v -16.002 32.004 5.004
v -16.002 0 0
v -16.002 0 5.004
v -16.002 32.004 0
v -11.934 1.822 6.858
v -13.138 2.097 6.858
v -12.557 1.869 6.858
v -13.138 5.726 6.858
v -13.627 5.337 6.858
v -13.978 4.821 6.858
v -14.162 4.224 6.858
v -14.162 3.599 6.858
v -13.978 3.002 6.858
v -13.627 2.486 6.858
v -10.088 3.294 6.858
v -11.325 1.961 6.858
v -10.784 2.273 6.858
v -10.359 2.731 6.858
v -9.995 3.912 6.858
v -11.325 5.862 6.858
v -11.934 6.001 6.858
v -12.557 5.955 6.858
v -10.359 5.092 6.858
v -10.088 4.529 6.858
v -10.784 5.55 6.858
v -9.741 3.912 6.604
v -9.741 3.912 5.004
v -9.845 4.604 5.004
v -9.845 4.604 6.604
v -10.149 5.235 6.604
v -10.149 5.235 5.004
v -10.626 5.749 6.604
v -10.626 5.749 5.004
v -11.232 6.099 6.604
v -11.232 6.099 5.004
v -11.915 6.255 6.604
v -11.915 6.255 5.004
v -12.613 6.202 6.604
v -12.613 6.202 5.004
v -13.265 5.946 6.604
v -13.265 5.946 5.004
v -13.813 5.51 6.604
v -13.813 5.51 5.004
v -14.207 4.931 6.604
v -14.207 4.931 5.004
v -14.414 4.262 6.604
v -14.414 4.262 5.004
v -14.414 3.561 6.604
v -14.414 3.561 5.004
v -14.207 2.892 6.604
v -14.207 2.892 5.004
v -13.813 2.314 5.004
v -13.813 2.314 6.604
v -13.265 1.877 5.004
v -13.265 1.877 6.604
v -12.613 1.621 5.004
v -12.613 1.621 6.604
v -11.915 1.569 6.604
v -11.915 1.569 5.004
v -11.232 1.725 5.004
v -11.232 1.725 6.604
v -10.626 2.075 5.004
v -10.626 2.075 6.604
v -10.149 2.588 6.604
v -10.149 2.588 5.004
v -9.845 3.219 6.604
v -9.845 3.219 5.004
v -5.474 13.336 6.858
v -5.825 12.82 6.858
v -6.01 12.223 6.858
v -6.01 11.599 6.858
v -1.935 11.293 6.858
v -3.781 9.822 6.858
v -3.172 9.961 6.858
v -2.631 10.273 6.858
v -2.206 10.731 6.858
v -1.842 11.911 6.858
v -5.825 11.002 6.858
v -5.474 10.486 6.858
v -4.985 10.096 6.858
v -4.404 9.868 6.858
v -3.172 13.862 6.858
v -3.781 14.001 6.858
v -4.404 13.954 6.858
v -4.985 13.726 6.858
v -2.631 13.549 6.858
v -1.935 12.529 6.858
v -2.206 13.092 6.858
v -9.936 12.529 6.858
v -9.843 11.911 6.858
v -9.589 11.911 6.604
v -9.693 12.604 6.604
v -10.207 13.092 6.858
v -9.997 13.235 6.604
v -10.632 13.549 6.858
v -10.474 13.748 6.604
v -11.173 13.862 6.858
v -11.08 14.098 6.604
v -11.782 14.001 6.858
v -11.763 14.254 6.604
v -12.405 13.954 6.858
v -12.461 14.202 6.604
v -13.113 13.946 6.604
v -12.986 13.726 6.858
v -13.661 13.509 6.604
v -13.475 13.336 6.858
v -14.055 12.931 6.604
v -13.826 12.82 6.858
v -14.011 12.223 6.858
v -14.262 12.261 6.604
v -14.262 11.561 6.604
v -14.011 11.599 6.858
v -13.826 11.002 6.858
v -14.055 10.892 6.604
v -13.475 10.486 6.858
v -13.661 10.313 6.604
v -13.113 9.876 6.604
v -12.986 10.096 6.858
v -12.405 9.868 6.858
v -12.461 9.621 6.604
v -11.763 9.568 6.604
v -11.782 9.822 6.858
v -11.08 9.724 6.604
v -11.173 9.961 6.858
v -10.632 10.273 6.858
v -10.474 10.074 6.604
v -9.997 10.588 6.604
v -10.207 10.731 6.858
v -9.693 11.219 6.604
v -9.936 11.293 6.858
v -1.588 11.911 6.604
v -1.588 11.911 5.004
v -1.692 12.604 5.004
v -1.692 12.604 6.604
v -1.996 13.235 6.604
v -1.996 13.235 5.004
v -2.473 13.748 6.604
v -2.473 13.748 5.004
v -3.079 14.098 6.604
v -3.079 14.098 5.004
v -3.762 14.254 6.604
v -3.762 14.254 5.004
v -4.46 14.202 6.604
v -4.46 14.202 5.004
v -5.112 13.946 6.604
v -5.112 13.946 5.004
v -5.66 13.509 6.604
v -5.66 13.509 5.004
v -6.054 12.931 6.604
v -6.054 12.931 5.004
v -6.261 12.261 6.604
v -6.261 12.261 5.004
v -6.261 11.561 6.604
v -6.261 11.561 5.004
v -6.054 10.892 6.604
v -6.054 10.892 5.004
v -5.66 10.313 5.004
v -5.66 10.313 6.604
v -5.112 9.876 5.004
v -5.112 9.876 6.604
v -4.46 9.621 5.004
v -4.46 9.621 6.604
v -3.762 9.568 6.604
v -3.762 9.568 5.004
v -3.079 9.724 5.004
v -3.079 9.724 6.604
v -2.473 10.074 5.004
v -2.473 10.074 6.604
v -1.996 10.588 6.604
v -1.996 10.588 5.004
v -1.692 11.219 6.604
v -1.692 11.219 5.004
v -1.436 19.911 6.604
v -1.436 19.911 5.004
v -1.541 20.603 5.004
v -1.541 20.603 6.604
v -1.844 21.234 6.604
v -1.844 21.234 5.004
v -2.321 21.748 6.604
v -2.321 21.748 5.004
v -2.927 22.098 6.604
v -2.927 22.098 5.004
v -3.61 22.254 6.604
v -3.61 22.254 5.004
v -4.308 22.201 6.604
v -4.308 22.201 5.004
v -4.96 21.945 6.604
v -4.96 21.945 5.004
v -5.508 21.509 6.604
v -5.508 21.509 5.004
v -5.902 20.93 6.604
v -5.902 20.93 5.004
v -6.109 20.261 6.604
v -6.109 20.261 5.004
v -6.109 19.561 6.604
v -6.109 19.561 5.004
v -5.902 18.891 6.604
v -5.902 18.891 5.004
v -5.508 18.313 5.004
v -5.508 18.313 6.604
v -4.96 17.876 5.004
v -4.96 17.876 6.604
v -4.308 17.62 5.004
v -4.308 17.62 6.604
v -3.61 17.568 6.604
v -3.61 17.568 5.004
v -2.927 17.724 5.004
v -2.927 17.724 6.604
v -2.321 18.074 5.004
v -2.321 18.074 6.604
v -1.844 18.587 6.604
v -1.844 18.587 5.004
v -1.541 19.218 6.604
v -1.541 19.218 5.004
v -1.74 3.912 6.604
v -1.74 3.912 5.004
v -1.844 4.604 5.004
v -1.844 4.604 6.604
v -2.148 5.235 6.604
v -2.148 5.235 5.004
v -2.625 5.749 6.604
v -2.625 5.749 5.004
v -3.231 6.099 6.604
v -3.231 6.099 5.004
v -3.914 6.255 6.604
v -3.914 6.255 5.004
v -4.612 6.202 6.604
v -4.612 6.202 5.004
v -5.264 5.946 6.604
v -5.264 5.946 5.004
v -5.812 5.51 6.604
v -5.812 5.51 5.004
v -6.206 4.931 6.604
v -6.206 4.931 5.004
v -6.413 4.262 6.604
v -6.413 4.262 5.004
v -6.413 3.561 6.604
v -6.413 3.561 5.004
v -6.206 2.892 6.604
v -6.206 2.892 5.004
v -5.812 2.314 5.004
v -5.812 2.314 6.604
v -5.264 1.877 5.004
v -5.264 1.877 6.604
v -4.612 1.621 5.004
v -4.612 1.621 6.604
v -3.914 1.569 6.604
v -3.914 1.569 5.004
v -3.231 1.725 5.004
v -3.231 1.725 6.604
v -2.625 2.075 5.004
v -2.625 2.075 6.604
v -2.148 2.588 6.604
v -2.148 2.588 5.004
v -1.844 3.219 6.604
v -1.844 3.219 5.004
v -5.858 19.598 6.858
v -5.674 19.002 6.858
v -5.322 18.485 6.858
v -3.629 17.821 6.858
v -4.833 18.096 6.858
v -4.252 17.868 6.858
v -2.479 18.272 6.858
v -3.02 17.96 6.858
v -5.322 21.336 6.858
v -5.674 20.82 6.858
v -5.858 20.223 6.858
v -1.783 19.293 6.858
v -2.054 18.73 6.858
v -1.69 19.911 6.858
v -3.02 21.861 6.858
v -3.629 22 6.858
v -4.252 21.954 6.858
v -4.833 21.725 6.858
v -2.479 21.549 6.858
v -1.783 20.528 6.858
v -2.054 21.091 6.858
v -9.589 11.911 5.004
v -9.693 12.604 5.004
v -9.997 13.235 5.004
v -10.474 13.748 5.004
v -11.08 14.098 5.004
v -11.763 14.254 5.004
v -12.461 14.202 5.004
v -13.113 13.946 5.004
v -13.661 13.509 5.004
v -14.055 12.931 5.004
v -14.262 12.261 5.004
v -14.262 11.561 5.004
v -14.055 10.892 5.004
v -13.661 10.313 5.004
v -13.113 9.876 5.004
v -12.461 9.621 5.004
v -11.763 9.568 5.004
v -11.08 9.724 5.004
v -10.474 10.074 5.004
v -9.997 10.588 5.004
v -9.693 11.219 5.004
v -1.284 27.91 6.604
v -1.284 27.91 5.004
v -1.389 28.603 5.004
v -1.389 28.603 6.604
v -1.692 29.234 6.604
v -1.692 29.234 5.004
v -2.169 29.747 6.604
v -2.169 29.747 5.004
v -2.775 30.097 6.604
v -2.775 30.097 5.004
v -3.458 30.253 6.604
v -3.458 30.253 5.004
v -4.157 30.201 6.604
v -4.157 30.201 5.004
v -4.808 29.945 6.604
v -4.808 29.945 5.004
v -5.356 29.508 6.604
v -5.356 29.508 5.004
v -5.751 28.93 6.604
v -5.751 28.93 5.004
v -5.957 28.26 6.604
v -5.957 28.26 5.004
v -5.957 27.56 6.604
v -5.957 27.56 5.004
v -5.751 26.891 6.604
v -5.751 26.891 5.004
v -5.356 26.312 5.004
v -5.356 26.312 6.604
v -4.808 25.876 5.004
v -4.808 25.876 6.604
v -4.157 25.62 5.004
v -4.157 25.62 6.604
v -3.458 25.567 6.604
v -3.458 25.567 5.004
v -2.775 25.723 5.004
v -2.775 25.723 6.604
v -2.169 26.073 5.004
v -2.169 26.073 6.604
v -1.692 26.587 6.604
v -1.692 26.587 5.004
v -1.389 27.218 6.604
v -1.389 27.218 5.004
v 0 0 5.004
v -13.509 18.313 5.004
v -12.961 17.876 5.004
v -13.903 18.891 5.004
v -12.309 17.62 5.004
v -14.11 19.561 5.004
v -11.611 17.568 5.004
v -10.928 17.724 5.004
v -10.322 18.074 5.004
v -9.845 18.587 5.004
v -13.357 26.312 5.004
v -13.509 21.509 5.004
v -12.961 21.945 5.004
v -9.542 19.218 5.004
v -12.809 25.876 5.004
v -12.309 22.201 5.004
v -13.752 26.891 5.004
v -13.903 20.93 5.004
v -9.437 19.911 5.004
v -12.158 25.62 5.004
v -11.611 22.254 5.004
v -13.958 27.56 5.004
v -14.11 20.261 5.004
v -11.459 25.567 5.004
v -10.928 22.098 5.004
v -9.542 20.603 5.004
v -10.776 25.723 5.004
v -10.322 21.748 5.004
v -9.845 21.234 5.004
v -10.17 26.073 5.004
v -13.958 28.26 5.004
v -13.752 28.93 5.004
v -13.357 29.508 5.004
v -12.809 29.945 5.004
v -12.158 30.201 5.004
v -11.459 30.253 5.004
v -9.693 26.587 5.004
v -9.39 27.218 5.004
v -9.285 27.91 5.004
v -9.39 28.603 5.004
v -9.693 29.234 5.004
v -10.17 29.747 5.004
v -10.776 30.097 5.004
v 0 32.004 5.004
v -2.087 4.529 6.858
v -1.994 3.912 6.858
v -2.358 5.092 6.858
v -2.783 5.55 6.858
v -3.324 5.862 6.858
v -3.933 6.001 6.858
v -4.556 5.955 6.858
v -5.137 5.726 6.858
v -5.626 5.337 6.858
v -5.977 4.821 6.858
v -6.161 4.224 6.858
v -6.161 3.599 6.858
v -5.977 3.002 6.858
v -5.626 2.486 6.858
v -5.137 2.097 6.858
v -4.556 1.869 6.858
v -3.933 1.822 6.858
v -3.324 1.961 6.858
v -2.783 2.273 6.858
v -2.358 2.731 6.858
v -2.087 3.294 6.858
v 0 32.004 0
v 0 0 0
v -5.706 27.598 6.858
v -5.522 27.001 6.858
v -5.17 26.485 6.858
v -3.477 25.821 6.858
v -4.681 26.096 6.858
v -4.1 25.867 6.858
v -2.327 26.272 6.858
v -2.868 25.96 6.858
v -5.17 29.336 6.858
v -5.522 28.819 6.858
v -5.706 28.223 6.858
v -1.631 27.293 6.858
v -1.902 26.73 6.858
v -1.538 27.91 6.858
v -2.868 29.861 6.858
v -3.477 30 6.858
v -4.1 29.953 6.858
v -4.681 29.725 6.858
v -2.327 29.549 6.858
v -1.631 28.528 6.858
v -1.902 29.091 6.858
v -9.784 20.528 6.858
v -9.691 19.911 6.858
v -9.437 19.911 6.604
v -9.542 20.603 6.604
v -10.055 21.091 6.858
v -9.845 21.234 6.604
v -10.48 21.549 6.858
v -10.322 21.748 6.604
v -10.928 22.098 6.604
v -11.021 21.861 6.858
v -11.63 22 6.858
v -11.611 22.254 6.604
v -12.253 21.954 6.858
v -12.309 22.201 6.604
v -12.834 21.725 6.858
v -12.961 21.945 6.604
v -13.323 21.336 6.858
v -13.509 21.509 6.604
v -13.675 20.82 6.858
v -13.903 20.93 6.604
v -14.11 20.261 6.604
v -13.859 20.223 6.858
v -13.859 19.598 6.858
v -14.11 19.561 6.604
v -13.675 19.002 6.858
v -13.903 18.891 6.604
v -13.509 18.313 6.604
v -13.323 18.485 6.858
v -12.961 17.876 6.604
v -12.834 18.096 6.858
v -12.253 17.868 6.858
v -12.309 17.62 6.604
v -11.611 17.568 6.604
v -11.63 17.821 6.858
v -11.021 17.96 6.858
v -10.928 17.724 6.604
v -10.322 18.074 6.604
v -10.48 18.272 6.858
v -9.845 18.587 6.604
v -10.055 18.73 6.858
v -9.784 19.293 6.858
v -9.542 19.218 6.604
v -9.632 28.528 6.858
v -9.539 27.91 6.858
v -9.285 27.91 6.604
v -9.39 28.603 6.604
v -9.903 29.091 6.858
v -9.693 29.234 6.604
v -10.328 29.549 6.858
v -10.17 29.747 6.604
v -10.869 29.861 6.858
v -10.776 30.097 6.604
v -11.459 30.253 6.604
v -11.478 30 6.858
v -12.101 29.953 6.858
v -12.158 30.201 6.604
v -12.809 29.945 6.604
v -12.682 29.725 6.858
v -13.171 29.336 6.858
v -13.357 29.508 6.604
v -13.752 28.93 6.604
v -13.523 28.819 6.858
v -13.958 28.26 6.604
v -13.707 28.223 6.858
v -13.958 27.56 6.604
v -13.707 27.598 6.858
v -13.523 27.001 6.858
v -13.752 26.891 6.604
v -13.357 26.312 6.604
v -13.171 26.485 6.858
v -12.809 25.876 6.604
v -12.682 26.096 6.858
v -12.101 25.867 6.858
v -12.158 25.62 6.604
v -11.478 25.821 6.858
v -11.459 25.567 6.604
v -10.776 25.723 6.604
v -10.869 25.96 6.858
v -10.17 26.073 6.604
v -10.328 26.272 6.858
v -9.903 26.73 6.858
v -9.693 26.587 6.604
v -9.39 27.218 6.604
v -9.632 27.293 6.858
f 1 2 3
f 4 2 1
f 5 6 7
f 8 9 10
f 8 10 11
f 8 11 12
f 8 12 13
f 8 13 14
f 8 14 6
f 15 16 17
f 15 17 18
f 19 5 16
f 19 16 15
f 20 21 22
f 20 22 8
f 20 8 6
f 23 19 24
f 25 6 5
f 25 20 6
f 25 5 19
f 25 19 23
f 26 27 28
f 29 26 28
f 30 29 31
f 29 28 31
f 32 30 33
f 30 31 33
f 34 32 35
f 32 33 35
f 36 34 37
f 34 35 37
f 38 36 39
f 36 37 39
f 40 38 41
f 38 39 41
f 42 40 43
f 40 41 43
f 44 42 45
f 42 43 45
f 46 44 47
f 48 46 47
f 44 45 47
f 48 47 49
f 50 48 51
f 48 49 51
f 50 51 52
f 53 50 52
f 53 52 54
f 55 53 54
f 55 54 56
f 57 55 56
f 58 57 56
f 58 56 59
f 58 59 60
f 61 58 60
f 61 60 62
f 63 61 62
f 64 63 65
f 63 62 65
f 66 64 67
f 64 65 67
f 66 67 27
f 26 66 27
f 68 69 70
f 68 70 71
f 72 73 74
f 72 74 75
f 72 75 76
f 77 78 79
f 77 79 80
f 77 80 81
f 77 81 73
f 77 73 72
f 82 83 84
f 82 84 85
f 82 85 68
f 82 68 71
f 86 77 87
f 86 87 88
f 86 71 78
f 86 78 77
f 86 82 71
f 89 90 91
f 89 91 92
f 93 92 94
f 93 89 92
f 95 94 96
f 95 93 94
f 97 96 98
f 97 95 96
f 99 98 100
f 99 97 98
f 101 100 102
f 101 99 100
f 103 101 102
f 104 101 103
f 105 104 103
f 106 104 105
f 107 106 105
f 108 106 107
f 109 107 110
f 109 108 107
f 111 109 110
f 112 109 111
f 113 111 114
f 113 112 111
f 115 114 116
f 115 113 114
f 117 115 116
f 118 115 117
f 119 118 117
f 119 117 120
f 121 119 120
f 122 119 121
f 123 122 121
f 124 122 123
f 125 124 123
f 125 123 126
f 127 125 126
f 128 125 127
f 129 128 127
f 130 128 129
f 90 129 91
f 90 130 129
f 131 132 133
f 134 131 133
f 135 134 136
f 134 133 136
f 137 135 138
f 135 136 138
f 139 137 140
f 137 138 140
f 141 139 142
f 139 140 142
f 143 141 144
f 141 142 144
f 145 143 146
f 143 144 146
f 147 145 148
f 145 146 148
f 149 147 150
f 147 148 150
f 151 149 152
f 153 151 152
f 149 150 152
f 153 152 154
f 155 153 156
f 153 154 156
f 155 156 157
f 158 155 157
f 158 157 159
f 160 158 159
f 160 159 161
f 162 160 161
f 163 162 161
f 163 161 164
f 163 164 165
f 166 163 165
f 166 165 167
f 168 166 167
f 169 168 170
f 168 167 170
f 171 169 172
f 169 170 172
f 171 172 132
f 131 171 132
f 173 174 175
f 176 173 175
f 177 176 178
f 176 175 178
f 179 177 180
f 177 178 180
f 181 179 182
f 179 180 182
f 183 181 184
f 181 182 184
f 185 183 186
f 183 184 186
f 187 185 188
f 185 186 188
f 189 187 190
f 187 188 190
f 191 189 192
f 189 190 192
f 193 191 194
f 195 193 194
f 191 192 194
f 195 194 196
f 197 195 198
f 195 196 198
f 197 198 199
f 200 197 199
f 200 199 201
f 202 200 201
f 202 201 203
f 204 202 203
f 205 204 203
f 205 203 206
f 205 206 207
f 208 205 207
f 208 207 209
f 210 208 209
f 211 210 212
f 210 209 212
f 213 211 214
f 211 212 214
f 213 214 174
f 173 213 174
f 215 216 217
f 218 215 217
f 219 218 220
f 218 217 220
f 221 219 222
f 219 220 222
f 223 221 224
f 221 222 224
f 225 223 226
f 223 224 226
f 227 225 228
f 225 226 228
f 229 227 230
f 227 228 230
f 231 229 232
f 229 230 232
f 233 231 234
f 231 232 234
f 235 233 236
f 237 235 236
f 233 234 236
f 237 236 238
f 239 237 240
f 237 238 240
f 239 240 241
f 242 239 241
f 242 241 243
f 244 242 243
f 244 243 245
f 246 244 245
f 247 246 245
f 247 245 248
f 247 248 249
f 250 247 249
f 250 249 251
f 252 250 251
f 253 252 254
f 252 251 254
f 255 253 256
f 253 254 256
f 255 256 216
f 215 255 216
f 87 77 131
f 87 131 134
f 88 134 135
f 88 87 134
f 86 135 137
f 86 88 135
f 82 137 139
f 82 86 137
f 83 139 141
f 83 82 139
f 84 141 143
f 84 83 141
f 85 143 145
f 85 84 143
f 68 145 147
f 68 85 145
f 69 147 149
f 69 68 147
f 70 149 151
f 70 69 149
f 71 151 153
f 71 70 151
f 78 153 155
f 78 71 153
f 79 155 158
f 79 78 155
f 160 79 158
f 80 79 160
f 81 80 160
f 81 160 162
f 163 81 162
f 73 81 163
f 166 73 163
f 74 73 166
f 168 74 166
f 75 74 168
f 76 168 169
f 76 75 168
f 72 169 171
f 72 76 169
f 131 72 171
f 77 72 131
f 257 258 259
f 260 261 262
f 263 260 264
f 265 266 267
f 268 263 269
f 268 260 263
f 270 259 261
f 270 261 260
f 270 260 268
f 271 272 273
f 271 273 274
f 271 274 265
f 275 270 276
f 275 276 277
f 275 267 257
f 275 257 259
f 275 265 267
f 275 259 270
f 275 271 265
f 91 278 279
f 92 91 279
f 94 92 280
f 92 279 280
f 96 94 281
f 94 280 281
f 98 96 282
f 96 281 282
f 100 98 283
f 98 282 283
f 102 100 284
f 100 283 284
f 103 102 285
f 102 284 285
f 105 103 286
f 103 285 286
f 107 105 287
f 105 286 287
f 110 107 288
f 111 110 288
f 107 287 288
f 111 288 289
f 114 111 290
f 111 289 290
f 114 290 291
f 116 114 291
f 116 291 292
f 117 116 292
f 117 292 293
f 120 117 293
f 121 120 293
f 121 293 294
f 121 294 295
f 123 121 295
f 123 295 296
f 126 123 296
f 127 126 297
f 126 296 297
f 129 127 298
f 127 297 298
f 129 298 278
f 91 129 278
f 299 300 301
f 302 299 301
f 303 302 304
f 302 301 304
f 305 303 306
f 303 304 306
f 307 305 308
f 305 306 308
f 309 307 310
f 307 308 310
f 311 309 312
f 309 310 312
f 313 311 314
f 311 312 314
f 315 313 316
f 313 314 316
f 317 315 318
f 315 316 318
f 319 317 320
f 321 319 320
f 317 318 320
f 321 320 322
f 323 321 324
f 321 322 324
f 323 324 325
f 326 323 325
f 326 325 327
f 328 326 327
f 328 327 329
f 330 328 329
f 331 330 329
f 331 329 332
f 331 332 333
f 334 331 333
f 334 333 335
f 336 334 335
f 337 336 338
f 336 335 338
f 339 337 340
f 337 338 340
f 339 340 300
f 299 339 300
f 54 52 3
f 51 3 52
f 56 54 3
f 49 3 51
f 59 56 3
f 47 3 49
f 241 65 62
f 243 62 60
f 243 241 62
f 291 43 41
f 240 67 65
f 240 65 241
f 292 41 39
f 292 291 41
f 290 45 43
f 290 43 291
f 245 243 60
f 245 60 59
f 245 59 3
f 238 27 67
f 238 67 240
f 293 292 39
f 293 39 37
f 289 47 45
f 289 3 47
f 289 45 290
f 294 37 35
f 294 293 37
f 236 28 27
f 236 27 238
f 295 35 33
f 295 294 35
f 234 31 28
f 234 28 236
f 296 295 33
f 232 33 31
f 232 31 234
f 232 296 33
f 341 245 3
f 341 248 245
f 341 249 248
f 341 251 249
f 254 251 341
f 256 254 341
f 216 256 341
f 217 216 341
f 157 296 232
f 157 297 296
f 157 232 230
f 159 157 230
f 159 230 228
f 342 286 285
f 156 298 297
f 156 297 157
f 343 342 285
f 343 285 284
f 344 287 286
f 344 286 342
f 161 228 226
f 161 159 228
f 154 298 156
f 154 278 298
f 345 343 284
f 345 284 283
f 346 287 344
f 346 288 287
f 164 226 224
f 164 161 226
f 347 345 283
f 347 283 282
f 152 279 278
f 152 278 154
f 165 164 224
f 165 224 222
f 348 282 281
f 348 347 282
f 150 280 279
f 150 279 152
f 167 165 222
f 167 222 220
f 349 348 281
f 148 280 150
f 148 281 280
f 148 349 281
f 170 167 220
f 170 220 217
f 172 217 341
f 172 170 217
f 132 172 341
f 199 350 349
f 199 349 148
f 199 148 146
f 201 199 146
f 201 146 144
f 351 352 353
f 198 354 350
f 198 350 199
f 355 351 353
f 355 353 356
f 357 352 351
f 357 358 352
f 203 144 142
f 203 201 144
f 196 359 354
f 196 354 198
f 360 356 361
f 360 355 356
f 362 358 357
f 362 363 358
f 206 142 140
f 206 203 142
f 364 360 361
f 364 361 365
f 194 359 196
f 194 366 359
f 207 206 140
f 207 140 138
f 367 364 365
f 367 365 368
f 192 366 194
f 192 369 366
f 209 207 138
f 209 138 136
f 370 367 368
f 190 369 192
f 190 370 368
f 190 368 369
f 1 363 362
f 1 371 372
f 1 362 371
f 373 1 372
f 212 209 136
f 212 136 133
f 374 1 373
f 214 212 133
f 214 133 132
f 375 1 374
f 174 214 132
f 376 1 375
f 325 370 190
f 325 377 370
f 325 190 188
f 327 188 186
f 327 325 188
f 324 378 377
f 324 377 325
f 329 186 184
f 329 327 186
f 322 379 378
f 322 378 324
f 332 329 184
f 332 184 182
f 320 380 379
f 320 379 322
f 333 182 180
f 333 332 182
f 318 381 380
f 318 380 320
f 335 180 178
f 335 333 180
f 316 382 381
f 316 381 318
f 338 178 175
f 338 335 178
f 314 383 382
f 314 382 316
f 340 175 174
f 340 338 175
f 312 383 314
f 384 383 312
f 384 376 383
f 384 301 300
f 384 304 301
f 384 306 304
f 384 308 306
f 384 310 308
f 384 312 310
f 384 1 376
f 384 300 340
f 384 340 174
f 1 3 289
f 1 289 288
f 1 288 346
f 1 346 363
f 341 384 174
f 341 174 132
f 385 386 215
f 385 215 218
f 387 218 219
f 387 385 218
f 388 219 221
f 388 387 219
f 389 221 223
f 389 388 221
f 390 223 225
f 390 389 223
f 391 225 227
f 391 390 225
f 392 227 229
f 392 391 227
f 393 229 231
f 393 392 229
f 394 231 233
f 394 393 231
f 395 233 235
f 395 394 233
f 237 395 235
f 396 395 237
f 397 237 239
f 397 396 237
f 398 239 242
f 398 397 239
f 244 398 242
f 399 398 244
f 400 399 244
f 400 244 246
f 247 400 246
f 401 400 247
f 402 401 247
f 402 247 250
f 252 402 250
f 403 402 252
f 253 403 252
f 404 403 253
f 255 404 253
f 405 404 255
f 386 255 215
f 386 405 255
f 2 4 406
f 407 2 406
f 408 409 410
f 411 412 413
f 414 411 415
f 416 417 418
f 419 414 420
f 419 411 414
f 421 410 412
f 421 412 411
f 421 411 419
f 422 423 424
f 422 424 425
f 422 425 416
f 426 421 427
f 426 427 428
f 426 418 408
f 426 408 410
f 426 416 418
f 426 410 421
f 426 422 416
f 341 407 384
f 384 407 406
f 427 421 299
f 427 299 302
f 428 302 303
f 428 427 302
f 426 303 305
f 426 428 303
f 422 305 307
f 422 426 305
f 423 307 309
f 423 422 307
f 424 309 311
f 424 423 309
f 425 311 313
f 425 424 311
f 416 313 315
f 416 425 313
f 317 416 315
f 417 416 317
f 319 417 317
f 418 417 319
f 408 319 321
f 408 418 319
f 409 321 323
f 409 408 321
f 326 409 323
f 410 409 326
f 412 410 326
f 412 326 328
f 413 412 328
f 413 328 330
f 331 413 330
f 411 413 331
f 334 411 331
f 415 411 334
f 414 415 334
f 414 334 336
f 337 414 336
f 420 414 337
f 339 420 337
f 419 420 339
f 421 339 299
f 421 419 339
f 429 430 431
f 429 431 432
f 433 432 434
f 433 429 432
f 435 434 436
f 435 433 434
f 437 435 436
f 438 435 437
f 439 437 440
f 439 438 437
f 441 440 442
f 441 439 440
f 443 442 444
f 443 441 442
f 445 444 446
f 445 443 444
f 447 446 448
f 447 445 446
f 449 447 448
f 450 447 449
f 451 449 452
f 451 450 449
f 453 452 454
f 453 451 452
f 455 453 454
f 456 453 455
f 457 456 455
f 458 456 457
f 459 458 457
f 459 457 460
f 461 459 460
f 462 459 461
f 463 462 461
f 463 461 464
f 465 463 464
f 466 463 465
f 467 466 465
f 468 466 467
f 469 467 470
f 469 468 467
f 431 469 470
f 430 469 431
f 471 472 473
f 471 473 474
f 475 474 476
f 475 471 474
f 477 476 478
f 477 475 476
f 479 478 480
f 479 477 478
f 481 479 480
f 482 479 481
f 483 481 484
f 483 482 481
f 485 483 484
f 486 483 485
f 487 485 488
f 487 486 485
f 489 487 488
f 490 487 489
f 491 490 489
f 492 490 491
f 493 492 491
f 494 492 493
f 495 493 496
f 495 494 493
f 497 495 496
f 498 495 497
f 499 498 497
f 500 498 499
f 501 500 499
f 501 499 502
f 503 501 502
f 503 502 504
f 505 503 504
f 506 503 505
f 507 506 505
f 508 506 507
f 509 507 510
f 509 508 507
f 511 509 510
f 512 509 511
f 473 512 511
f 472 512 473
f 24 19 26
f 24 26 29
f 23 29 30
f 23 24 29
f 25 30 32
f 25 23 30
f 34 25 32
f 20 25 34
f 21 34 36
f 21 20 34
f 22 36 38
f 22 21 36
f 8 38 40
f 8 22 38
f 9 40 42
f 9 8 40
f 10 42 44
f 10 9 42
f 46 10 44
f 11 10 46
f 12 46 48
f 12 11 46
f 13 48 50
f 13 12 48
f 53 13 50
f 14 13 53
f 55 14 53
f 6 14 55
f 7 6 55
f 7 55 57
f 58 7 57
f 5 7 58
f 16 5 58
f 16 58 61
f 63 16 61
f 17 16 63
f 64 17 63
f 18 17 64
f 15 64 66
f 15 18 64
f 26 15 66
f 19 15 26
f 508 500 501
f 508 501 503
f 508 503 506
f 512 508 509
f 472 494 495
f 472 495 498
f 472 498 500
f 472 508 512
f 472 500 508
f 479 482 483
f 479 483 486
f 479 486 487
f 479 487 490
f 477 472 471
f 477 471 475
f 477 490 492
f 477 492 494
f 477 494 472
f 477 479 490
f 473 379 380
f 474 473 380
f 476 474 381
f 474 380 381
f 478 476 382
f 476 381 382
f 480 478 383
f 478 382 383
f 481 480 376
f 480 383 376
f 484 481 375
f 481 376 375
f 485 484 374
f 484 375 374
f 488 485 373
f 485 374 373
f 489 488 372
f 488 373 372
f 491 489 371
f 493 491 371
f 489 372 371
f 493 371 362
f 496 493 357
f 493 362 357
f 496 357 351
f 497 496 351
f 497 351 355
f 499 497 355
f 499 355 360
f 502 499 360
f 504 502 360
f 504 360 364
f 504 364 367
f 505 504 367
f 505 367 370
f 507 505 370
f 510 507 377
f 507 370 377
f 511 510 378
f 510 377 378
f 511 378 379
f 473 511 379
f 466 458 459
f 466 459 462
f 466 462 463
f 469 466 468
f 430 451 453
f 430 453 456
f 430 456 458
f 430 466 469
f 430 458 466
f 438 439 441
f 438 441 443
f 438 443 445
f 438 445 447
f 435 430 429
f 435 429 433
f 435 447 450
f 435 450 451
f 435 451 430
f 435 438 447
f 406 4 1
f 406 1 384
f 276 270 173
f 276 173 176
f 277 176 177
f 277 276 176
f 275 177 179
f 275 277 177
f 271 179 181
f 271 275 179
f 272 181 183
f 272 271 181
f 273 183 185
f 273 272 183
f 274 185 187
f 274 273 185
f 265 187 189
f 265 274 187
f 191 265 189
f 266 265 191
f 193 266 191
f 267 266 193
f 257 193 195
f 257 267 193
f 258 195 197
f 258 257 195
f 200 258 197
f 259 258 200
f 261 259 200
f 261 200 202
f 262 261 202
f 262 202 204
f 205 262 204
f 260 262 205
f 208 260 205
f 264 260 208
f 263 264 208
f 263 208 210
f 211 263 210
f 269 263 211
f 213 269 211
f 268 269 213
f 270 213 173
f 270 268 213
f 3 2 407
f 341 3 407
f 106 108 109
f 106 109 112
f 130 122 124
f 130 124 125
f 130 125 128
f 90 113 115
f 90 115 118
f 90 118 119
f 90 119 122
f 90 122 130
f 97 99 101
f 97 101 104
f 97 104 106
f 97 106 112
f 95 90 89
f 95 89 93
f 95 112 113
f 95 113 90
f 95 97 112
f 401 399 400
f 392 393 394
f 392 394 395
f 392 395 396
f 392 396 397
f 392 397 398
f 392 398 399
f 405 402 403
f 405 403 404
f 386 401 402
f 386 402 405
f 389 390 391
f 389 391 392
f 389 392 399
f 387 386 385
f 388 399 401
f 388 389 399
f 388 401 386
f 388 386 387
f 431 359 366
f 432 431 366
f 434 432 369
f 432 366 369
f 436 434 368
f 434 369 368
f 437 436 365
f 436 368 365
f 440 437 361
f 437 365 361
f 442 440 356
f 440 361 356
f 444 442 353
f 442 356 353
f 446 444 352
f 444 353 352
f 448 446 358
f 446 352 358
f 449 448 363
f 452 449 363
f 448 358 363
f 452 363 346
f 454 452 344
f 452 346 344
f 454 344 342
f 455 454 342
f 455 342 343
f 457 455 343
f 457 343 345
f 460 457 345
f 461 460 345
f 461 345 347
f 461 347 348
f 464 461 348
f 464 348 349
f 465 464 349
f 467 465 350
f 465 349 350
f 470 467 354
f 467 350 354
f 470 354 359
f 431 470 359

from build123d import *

# Parameters (mm, degrees)
F0_W     = 16.002
F0_H     = 32.004
F1_DEPTH = 5.0038
F2_R     = 2.3495
F3_DEPTH = 1.8542
F4_SIZE  = 0.254


with BuildPart() as f1:
    # F0 (on Top) → F1 (new body)
    with BuildSketch(Plane.XY):
        with Locations((-8.001, 16.002)):
            Rectangle(F0_W, F0_H)
    extrude(amount=F1_DEPTH)

    # F2 (on face) → F3 (join)
    with BuildSketch(Plane.XY.offset(5.0038)):
        with Locations((-12.0904, 3.9116)):
            Circle(F2_R)
        with Locations((-11.93851, 11.911158)):
            Circle(F2_R)
        with Locations((-11.634729, 27.910274)):
            Circle(F2_R)
        with Locations((-4.0894, 3.9116)):
            Circle(F2_R)
        with Locations((-3.93751, 11.911158)):
            Circle(F2_R)
        with Locations((-3.785619, 19.910716)):
            Circle(F2_R)
        with Locations((-11.786619, 19.910716)):
            Circle(F2_R)
        with Locations((-3.633729, 27.910274)):
            Circle(F2_R)
    extrude(amount=F3_DEPTH)

    # F4
    f4_edges = [f1.edges().sort_by_distance(p)[0] for p in [
        (-14.4399, 3.9116, 6.858),
        (-14.28801, 11.911158, 6.858),
        (-14.136119, 19.910716, 6.858),
        (-13.984229, 27.910274, 6.858),
        (-5.983229, 27.910274, 6.858),
        (-6.135119, 19.910716, 6.858),
        (-6.28701, 11.911158, 6.858),
        (-6.4389, 3.9116, 6.858),
    ]]
    chamfer(f4_edges, length=F4_SIZE)


solid = f1.part
